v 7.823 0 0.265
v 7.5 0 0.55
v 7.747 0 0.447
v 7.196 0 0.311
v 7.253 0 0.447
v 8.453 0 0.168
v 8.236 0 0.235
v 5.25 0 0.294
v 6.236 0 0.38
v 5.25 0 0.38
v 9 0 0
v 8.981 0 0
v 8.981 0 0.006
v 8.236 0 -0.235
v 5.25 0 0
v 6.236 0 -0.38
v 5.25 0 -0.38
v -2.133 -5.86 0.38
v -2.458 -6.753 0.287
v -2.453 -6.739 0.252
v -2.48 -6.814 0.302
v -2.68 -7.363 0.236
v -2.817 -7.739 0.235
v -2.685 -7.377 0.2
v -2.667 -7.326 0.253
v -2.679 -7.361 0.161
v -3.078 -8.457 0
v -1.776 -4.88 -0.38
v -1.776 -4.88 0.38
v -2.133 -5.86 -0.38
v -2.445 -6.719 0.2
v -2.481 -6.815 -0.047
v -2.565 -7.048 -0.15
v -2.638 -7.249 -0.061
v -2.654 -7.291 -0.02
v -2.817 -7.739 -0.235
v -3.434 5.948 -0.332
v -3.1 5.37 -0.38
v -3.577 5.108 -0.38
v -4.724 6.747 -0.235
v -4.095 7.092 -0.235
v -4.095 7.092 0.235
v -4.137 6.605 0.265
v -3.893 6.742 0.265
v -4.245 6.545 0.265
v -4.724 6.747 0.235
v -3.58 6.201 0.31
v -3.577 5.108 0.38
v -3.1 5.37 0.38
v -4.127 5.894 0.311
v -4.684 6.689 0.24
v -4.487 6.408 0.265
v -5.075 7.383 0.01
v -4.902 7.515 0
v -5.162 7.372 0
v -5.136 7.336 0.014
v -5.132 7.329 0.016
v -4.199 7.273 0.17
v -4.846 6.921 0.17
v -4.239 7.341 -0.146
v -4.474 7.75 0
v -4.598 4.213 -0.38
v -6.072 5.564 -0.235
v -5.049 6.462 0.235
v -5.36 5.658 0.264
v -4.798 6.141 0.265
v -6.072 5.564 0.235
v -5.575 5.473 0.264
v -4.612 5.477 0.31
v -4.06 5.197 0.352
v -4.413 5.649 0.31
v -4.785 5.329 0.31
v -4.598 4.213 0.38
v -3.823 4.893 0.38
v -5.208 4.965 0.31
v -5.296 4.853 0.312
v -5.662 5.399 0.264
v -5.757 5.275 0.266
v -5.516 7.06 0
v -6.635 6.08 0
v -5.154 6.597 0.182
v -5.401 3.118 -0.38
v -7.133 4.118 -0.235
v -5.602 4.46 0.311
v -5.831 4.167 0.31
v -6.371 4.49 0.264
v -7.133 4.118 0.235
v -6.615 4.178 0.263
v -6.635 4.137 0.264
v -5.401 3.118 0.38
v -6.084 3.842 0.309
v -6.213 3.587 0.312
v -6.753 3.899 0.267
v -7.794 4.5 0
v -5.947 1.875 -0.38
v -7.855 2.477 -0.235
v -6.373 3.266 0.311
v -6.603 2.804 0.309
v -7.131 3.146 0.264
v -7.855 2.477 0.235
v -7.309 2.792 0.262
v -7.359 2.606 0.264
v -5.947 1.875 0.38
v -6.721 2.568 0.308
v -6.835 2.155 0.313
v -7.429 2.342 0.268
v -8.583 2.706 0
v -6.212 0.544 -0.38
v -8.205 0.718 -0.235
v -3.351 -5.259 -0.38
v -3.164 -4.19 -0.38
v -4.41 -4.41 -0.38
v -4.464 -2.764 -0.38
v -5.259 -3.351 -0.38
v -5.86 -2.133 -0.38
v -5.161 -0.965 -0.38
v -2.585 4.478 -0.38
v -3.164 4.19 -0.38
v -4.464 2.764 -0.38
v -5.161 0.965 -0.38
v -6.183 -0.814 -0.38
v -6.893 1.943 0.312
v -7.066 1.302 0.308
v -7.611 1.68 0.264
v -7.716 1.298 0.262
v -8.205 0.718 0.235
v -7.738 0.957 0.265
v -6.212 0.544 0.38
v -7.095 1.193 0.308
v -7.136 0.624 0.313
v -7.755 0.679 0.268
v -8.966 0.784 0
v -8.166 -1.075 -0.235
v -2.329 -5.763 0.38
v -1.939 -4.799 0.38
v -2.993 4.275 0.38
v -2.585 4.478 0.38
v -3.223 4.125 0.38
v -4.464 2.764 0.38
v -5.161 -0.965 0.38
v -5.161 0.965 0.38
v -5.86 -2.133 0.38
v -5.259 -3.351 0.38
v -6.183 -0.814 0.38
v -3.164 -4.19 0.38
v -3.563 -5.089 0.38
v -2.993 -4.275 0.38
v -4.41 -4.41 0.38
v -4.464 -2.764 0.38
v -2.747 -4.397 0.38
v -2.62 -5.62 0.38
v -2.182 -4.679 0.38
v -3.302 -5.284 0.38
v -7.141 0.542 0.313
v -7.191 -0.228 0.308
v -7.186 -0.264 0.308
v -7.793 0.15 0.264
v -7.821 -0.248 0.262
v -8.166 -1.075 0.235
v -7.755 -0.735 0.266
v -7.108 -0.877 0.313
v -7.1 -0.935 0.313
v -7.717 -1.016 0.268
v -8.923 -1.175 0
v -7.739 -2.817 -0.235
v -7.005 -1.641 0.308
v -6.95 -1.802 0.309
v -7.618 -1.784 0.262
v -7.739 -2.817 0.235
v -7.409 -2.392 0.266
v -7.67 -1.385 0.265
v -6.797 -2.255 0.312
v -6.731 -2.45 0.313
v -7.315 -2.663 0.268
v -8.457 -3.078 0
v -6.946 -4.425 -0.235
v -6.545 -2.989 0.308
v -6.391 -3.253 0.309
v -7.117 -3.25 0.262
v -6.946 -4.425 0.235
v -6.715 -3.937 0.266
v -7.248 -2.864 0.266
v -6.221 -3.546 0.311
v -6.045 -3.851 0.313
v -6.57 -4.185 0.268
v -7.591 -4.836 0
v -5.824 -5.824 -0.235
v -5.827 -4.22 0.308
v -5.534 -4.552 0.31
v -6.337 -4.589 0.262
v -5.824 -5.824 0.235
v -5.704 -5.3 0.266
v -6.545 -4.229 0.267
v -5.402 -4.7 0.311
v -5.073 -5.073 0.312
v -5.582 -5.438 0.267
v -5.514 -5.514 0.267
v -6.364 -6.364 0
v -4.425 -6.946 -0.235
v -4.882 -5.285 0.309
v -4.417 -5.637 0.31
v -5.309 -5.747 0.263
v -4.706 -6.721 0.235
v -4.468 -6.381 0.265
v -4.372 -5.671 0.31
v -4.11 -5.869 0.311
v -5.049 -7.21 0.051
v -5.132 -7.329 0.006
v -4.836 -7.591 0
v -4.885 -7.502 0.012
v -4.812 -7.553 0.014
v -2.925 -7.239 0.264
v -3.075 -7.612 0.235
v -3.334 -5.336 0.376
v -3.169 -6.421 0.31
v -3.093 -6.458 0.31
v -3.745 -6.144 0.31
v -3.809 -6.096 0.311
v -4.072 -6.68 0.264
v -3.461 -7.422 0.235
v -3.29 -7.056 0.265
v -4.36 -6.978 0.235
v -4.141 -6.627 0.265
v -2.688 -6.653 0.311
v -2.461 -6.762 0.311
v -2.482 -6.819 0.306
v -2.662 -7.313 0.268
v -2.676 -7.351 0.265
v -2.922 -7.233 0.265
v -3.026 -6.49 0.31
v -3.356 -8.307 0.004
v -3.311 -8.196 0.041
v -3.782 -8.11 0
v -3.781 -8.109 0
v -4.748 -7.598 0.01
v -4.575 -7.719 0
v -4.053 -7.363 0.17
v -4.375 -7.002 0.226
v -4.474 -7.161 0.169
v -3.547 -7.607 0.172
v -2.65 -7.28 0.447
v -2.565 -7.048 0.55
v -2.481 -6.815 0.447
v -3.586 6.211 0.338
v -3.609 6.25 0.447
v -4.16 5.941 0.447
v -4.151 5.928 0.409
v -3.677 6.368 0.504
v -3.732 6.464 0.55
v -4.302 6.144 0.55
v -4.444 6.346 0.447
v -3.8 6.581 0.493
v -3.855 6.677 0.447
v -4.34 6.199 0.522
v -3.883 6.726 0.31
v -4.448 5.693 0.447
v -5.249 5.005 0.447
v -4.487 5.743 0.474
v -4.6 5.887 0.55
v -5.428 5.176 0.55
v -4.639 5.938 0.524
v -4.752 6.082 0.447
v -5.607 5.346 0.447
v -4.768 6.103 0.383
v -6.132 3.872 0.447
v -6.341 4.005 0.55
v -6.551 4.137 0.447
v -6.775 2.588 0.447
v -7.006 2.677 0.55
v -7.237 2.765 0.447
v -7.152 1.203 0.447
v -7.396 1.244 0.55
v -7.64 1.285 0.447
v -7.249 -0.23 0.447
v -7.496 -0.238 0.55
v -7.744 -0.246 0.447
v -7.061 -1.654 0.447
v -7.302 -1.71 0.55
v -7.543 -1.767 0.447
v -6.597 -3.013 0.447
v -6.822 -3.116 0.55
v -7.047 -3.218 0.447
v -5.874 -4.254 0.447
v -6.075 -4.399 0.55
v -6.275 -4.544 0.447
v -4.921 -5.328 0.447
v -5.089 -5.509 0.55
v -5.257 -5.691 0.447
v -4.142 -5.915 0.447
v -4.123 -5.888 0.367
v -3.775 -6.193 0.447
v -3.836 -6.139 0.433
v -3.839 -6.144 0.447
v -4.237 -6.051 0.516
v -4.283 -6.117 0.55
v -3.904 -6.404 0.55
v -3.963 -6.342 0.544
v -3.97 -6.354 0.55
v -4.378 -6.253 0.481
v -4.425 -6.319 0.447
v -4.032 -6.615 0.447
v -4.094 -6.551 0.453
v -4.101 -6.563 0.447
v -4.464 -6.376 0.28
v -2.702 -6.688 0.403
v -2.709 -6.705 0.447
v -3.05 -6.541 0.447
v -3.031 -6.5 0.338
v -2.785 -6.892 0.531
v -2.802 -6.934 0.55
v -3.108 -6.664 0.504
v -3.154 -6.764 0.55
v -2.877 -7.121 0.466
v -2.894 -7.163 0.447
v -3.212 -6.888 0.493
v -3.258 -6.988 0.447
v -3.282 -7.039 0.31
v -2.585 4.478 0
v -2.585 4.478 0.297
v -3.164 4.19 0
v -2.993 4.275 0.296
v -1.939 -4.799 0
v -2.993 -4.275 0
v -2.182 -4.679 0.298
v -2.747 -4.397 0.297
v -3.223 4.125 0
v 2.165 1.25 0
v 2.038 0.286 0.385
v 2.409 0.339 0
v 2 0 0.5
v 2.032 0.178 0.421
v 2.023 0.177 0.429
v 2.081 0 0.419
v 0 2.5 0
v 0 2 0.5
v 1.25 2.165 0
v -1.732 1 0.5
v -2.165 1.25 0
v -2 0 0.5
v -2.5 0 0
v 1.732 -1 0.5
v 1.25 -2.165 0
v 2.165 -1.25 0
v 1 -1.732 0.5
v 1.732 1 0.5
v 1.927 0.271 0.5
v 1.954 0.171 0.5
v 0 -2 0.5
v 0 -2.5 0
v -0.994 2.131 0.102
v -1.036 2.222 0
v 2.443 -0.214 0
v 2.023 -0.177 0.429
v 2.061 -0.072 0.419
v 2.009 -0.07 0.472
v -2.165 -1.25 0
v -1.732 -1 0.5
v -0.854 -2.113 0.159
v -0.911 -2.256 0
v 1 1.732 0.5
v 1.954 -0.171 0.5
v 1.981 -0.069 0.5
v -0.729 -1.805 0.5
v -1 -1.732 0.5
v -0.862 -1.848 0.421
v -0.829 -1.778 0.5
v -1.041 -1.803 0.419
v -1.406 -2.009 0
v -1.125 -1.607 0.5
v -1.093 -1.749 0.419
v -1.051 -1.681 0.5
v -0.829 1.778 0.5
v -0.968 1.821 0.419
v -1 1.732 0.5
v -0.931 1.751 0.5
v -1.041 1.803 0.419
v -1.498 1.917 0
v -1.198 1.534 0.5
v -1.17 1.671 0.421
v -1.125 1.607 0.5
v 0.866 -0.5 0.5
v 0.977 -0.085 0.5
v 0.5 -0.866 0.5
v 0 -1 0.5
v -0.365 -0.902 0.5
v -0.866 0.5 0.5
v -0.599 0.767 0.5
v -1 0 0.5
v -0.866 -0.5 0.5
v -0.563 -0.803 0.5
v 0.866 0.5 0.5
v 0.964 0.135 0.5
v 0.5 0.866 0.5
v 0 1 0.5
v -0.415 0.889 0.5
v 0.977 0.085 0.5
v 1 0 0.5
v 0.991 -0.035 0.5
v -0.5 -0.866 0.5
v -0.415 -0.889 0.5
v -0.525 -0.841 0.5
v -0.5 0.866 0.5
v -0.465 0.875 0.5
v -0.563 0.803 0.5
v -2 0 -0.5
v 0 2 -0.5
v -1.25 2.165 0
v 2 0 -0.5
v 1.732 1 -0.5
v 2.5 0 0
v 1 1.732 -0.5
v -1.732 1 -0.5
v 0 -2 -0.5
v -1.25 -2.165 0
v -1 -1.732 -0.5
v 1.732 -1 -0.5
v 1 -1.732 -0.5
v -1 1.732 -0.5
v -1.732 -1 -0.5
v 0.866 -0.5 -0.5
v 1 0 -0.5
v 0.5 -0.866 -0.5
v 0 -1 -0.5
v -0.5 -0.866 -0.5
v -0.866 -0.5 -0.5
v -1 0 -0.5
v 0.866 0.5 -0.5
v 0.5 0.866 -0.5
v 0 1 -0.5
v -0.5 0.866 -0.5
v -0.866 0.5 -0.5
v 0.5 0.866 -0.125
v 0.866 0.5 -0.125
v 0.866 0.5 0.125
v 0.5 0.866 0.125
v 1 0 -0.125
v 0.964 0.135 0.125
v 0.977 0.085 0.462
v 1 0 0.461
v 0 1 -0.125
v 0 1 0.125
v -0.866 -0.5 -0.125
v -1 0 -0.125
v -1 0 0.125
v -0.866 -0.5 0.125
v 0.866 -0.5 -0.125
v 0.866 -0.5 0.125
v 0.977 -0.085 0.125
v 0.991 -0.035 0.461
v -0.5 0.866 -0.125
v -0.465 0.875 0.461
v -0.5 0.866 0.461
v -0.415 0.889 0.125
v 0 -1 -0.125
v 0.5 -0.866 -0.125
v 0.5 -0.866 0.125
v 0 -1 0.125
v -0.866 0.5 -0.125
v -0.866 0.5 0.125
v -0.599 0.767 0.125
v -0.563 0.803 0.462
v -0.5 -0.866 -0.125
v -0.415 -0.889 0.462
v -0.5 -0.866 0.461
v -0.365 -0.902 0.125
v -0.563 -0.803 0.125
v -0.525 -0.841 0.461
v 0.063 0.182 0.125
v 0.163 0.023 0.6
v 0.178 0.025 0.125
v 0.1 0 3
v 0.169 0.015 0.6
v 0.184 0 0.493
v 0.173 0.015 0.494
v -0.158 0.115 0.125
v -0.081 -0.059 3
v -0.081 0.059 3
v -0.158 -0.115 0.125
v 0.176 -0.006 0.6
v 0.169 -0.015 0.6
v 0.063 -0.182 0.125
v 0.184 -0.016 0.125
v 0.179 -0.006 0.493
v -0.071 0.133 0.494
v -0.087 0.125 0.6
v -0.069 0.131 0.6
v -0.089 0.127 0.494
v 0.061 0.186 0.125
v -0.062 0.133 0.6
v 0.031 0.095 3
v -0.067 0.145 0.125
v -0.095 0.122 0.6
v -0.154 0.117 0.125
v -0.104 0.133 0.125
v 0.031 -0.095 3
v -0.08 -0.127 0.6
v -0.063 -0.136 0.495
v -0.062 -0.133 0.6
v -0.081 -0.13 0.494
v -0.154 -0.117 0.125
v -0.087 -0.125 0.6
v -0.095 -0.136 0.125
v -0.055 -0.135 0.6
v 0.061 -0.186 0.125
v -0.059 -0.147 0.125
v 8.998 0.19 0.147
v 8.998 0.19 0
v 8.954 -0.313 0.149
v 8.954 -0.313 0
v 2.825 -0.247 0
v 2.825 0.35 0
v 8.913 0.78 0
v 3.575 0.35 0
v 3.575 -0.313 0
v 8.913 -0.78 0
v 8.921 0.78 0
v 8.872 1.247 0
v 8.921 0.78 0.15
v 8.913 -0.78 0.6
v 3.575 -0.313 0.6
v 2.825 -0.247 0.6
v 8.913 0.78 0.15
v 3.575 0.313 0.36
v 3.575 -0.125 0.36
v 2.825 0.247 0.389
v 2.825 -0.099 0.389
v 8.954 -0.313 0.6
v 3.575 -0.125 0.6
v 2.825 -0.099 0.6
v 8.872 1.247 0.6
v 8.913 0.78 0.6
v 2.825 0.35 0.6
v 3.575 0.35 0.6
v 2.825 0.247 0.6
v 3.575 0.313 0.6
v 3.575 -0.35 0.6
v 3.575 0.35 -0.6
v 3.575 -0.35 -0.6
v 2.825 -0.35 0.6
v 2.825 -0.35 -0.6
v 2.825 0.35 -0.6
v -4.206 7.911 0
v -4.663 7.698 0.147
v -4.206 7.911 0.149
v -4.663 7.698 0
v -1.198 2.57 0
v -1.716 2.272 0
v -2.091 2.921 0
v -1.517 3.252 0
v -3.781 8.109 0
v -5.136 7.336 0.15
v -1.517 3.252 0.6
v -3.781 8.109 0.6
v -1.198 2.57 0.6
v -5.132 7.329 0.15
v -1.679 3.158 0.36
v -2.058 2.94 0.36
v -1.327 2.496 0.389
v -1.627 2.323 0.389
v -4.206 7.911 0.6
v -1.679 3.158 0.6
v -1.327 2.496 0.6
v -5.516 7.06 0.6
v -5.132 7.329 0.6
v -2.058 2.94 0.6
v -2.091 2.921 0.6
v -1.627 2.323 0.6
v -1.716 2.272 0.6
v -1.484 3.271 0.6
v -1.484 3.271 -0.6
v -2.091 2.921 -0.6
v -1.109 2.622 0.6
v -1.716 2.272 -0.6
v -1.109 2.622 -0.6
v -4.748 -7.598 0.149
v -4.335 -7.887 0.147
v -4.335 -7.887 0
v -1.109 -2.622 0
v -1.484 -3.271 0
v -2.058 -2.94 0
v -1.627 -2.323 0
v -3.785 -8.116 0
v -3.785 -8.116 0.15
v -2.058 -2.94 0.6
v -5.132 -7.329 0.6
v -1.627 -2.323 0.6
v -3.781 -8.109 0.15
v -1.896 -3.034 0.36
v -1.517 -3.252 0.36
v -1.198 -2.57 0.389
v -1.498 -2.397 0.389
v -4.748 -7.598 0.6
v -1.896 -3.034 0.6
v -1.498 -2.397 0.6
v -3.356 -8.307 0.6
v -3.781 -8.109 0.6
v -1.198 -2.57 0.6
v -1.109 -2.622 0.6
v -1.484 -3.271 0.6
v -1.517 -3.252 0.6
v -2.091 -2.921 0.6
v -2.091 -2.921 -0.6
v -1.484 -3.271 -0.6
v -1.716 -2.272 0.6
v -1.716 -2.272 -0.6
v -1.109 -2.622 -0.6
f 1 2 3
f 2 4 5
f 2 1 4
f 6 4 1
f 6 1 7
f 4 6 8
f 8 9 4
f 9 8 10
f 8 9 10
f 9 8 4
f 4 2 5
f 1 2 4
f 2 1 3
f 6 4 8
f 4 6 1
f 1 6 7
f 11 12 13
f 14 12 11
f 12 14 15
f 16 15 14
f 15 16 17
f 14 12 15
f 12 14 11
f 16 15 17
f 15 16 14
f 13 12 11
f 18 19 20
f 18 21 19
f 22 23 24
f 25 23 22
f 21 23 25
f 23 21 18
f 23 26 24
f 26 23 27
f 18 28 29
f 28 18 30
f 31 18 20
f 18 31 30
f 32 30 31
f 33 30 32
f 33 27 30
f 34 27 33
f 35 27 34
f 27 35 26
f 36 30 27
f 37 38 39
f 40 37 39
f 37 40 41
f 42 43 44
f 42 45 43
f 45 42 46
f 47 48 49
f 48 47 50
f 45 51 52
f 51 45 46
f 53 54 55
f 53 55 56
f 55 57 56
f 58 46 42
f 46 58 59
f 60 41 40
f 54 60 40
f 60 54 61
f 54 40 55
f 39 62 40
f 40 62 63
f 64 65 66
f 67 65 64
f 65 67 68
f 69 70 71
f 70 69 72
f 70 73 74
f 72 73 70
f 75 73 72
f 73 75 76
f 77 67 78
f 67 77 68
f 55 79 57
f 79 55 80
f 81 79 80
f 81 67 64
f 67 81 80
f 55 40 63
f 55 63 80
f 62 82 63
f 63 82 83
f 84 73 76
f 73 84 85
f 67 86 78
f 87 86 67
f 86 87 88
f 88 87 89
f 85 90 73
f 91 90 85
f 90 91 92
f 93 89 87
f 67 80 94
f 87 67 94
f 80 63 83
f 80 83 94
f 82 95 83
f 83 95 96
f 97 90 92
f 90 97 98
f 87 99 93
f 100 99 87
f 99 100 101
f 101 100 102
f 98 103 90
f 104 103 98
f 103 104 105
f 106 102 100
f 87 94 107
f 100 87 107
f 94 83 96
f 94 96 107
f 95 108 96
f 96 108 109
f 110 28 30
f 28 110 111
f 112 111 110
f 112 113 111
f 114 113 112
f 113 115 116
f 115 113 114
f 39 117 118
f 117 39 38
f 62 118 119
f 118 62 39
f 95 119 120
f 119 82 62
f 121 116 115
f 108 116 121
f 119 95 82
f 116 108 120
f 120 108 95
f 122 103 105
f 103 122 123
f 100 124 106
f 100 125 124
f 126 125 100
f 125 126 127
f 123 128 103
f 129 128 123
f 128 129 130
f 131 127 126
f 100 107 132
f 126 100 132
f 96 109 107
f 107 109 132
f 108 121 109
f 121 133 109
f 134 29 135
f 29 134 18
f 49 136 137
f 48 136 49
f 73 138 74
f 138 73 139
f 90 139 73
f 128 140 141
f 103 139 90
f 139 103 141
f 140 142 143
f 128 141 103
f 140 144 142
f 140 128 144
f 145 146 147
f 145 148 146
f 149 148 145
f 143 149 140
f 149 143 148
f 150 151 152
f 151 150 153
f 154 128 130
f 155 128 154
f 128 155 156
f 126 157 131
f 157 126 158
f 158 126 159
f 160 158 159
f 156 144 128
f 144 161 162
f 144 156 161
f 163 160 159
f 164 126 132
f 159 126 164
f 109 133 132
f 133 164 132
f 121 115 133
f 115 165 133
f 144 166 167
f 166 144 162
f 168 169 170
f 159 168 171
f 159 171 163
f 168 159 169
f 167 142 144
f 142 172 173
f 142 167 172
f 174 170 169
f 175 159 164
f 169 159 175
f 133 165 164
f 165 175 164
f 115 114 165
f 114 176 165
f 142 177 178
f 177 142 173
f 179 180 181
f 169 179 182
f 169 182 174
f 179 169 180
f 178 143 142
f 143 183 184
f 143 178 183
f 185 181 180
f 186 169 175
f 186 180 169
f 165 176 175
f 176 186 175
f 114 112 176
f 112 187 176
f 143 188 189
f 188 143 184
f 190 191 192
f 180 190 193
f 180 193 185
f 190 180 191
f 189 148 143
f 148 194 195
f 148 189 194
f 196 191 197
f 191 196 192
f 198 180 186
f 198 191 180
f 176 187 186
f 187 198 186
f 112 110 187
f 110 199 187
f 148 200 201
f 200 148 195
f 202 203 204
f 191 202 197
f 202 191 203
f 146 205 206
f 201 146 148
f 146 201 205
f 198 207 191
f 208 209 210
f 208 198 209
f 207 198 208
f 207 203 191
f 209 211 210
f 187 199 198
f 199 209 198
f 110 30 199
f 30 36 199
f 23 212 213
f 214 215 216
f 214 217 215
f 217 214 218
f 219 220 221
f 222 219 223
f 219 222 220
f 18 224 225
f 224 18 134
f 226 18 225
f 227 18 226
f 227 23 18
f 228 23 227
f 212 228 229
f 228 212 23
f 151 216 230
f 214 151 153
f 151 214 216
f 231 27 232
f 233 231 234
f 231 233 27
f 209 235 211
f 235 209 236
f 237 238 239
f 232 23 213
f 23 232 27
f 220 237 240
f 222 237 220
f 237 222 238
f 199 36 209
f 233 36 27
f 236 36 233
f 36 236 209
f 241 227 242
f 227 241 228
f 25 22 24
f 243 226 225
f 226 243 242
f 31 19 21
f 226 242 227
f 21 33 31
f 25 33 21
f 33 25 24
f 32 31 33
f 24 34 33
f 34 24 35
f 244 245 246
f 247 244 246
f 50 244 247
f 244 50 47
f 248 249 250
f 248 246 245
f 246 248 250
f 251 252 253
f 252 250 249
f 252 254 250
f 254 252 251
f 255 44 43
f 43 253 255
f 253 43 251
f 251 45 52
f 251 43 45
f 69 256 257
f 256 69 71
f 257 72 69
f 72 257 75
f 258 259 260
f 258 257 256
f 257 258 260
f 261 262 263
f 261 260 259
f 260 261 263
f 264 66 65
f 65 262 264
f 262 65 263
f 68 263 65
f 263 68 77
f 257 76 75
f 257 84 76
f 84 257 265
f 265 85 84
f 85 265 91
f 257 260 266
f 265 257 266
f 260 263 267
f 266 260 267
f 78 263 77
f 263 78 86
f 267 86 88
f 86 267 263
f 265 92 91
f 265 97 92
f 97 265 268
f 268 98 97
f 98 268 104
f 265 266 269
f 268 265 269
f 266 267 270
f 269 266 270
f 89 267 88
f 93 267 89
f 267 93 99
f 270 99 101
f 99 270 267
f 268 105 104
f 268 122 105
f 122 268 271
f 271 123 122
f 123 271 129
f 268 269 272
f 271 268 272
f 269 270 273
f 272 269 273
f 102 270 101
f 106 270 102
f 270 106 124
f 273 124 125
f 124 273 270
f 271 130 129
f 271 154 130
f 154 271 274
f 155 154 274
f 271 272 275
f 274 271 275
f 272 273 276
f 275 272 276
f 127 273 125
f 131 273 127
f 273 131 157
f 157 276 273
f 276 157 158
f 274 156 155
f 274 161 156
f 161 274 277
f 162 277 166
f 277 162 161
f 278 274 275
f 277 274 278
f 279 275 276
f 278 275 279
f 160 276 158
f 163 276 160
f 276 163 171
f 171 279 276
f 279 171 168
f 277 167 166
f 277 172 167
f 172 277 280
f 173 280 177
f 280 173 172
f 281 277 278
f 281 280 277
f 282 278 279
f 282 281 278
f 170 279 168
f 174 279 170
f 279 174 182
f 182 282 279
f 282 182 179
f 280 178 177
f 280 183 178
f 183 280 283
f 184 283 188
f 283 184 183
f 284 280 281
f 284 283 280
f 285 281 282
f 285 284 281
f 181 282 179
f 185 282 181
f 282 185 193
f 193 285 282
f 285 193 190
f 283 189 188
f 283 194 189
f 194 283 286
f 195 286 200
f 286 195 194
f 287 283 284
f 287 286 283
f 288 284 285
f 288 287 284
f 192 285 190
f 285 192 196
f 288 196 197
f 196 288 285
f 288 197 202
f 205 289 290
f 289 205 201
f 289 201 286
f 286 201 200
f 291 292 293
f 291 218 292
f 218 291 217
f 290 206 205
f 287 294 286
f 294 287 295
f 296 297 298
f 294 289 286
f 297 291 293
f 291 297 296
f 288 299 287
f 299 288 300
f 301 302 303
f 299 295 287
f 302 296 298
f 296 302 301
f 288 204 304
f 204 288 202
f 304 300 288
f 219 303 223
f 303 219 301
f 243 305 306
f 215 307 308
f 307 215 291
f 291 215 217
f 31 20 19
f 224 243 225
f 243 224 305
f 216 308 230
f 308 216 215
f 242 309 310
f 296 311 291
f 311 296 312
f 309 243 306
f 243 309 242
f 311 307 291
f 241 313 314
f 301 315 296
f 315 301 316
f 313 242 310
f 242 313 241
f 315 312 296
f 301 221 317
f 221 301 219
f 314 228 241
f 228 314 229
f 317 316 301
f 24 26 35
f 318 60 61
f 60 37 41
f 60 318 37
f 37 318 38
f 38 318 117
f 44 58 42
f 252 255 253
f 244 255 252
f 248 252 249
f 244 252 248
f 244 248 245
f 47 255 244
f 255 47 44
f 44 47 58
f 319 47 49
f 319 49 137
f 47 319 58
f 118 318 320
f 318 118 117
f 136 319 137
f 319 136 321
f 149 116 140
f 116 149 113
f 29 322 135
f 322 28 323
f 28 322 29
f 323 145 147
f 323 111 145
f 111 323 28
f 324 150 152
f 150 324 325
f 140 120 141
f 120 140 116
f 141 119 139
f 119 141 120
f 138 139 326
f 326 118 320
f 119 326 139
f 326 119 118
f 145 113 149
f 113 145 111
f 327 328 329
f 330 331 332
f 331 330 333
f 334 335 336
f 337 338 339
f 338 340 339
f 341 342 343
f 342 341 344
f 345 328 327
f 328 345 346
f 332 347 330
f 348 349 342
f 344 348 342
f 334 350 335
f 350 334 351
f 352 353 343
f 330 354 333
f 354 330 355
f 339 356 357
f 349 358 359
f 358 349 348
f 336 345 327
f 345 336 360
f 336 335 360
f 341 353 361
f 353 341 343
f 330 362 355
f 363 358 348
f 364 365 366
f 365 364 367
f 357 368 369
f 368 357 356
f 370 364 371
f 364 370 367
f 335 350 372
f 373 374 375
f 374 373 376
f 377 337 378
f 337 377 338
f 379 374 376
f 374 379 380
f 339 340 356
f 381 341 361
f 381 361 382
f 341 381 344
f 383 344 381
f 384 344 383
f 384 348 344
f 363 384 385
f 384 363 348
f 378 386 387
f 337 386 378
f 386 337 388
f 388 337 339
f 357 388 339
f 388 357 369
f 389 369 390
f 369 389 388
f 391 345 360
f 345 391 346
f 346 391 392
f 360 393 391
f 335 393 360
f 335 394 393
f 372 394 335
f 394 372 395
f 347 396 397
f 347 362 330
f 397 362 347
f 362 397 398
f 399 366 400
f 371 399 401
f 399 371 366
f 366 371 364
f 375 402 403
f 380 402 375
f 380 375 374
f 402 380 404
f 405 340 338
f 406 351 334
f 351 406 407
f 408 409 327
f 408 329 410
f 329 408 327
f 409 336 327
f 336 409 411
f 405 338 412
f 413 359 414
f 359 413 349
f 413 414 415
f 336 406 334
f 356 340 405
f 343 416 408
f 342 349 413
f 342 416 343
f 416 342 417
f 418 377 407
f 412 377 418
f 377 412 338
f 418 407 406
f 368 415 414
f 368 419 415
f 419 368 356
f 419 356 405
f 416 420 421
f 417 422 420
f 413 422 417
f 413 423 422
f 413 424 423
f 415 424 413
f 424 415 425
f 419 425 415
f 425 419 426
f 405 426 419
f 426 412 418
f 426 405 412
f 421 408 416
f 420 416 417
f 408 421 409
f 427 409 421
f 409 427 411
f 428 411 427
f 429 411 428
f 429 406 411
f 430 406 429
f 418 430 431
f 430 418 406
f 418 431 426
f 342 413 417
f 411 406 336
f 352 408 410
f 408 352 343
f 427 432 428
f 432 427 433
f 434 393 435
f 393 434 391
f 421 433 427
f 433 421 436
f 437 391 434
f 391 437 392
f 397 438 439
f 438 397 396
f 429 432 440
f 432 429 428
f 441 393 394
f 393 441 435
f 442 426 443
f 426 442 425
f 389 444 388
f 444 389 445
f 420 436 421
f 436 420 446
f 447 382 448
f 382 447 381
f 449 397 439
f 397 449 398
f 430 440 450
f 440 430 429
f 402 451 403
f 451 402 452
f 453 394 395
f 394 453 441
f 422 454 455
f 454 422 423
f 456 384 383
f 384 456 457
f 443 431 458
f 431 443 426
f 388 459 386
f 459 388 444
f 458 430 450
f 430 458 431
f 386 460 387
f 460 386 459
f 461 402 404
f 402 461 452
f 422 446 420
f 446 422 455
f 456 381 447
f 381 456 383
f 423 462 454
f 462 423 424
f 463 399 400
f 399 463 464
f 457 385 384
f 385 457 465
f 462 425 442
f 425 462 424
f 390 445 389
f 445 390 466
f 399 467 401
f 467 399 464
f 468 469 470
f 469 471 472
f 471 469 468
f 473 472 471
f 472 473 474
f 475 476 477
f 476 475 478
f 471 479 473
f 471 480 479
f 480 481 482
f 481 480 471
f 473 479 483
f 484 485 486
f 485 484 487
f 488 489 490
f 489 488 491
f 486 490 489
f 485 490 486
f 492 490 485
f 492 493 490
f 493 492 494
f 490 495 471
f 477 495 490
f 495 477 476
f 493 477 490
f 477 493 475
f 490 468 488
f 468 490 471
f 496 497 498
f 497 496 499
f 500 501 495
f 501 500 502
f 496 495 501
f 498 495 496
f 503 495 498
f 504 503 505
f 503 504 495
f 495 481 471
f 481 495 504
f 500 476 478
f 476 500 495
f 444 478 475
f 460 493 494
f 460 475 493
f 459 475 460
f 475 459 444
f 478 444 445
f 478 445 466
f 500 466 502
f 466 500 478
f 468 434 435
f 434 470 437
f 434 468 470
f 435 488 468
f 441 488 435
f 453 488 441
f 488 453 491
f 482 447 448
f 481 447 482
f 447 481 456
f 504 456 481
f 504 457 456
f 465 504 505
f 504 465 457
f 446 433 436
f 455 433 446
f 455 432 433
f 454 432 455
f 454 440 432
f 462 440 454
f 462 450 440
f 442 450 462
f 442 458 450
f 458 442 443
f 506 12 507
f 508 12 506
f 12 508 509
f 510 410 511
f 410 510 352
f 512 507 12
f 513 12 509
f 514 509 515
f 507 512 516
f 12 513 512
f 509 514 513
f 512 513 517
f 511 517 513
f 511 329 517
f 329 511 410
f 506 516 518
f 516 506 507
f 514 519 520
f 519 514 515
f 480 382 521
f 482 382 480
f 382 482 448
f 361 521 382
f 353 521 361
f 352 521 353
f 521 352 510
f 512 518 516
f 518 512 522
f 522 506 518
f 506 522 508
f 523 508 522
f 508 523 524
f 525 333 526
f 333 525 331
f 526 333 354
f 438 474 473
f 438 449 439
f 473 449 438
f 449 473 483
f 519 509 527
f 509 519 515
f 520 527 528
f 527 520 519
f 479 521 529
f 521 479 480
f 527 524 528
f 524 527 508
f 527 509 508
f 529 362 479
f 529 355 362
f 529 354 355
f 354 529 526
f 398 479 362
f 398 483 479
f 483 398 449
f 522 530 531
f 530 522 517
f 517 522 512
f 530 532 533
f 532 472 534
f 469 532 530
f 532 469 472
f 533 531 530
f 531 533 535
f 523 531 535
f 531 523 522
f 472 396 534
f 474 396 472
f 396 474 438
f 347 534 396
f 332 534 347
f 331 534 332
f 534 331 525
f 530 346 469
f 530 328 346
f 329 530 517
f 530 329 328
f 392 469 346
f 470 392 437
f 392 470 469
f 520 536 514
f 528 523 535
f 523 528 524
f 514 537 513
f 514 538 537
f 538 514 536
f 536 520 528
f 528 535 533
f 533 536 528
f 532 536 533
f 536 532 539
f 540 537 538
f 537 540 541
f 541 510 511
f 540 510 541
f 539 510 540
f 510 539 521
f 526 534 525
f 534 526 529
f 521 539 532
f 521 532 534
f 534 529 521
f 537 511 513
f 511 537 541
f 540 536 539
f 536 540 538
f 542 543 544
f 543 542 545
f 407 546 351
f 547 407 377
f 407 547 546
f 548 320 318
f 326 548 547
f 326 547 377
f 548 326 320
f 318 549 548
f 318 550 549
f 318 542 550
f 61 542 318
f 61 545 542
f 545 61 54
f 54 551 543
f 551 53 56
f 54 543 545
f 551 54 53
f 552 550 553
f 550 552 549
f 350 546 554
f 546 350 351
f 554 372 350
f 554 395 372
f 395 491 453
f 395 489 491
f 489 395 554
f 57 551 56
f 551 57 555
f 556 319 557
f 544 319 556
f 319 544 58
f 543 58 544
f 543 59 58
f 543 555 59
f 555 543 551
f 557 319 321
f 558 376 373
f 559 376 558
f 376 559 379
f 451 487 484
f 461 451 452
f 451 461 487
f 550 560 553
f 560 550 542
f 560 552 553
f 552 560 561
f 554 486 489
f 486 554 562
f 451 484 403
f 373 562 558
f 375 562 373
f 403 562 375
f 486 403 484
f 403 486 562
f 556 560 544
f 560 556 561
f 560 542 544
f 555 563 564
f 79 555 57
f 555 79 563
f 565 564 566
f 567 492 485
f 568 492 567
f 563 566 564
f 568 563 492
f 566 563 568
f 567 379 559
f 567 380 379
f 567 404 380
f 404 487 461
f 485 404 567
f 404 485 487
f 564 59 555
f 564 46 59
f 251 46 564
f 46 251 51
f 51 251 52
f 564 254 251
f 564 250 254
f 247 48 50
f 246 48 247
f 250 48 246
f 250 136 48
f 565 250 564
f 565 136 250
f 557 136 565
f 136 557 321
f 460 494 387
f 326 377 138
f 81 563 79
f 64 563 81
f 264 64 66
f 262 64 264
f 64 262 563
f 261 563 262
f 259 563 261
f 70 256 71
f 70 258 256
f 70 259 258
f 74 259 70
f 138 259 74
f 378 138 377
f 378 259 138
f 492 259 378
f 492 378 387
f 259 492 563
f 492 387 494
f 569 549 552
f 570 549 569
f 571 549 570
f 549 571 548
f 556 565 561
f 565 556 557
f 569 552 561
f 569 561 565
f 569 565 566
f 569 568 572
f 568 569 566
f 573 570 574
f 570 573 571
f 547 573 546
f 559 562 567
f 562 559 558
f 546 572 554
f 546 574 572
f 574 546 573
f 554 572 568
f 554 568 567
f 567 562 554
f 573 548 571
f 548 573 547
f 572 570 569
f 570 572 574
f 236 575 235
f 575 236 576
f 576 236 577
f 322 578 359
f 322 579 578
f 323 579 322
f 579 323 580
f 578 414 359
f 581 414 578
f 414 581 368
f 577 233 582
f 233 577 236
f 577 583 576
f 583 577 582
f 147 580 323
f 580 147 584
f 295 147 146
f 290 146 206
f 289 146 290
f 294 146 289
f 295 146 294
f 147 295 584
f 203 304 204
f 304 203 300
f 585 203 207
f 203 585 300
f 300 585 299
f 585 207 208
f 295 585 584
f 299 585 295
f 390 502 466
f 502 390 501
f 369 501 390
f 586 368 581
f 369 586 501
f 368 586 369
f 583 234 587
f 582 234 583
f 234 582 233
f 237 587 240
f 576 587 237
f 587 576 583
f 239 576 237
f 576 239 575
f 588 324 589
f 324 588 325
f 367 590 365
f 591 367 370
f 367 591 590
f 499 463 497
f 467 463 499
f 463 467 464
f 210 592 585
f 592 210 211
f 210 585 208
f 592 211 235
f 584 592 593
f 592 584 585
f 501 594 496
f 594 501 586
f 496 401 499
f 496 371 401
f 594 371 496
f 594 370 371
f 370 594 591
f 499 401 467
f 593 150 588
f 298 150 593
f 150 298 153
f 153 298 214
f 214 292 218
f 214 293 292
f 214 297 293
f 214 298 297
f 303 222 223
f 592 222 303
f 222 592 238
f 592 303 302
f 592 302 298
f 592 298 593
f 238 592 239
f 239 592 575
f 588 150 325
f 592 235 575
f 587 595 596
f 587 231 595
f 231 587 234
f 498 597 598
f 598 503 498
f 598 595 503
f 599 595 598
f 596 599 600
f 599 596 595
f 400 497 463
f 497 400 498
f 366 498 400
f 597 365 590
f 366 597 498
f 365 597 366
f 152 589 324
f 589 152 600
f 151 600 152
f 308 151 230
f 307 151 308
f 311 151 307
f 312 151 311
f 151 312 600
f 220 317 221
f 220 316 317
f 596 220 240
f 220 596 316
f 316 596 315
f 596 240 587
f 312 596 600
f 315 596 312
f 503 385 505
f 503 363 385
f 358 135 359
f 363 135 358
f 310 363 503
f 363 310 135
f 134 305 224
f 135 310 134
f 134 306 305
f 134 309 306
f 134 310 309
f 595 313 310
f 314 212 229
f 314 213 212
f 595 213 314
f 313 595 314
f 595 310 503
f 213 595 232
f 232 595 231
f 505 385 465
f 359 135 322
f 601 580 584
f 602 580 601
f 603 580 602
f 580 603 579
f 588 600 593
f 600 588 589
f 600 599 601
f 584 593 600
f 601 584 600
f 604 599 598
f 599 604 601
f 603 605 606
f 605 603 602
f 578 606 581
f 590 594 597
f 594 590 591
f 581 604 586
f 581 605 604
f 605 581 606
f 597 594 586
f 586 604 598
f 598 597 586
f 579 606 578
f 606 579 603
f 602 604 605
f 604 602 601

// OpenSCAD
// file: wedge.scad
//Title: Wedge Module
//Author: Alex English - ProtoParadigm
//Date: 1/4/2013
//License: Creative Commons - Share Alike - Attribution

//Usage: Include in your other .scad projects and call wedge with arguments for the height of the wedge, the radius of the wedge, and the angle of the wedge in degrees.  The resulting wedge will be placed with the point at the origin, extending into the z axis, with the angle starting at the x axis and extending counter-clockwise as per the right-hand rule.

module wedge_180(h, r, d)
{
	rotate(d) difference()
	{
		rotate(180-d) difference()
		{
			cylinder(h = h, r = r);
			translate([-(r+1), 0, -1]) cube([r*2+2, r+1, h+2]);
		}
		translate([-(r+1), 0, -1]) cube([r*2+2, r+1, h+2]);
	}
}

module wedge(h, r, d)
{
	if(d <= 180)
		wedge_180(h, r, d);
	else
		rotate(d) difference()
		{
			cylinder(h = h, r = r);
			wedge_180(h, r, 360-d);
		}
}

//Example: wedge(10, 20, 33); //would create a wedge 10 high, with a radius of 20, and an angle of 33 degrees.
// main file
include <wedge.scad>;

/* loosley modeled after cbase hackerspace space station */


module outer_ring()
{
	difference() {
		union() {
			scale(v = [1, 1, 0.1])
				rotate_extrude(height = 5, angle = 250, convexity = 10)
					translate([5, 0, 0])
						circle(r = 4, $fn = 10);
			translate([0, 0, 0.20])
			rotate_extrude(height = 0.5, angle=250, convexity=10, $fn=32)
					translate([7.50, 0, 0])
						circle(r = 0.35, $fn=8);
		}
		cylinder(h = 10, r1 = 5.25, r2 = 5.25, center = true);
		translate(v = [0, 0, -2])
			wedge(5, 10, 120);
	}
}

module central_hub()
{
	difference() {
		union() {
			cylinder(h = 0.5, r1 = 2.5, r2 = 2, $fn=12);
			rotate(a = 180, v = [0, 1, 0])
				cylinder(h = 0.5, r1 = 2.5, r2 = 2, $fn=12);
		}
		cylinder(h = 2, r1 = 1, r2 = 1, center = true, $fn = 12);
	}
	cylinder(h = 3, r1 = 0.2, r2 = 0.1);
	cylinder(h = 0.25, r1 = 2.1, r2 = 2.1, center = true);
}

module spoke()
{
	difference() {
	rotate(a = -5, v = [0, 0, 1])
		wedge(0.5, 9, 10);
	rotate(a = 2.25, v = [0, 1, 0])
		translate(v = [0, -4.5, 0.5])
			cube(size = [9, 9, 0.5]);
	}
	rotate(a = -5, v = [0, 0, 1])
		wedge(0.6, 9, 3);
	rotate(a = 5, v = [0, 0, 1])
		wedge(0.6, 9, 3);
	translate(v = [3.2, 0, 0])
			cube(size = [0.75, 0.7, 1.2], center = true);
}

module spokes()
{
	union() {
		spoke(0.5, 9, 10);
		rotate(a = 120, v = [0, 0, 1])
			spoke(0.5, 9, 10);
		rotate(a = -120, v = [0, 0, 1])
			spoke(0.5, 9, 10);
	}
}

outer_ring();
central_hub();
spokes();
